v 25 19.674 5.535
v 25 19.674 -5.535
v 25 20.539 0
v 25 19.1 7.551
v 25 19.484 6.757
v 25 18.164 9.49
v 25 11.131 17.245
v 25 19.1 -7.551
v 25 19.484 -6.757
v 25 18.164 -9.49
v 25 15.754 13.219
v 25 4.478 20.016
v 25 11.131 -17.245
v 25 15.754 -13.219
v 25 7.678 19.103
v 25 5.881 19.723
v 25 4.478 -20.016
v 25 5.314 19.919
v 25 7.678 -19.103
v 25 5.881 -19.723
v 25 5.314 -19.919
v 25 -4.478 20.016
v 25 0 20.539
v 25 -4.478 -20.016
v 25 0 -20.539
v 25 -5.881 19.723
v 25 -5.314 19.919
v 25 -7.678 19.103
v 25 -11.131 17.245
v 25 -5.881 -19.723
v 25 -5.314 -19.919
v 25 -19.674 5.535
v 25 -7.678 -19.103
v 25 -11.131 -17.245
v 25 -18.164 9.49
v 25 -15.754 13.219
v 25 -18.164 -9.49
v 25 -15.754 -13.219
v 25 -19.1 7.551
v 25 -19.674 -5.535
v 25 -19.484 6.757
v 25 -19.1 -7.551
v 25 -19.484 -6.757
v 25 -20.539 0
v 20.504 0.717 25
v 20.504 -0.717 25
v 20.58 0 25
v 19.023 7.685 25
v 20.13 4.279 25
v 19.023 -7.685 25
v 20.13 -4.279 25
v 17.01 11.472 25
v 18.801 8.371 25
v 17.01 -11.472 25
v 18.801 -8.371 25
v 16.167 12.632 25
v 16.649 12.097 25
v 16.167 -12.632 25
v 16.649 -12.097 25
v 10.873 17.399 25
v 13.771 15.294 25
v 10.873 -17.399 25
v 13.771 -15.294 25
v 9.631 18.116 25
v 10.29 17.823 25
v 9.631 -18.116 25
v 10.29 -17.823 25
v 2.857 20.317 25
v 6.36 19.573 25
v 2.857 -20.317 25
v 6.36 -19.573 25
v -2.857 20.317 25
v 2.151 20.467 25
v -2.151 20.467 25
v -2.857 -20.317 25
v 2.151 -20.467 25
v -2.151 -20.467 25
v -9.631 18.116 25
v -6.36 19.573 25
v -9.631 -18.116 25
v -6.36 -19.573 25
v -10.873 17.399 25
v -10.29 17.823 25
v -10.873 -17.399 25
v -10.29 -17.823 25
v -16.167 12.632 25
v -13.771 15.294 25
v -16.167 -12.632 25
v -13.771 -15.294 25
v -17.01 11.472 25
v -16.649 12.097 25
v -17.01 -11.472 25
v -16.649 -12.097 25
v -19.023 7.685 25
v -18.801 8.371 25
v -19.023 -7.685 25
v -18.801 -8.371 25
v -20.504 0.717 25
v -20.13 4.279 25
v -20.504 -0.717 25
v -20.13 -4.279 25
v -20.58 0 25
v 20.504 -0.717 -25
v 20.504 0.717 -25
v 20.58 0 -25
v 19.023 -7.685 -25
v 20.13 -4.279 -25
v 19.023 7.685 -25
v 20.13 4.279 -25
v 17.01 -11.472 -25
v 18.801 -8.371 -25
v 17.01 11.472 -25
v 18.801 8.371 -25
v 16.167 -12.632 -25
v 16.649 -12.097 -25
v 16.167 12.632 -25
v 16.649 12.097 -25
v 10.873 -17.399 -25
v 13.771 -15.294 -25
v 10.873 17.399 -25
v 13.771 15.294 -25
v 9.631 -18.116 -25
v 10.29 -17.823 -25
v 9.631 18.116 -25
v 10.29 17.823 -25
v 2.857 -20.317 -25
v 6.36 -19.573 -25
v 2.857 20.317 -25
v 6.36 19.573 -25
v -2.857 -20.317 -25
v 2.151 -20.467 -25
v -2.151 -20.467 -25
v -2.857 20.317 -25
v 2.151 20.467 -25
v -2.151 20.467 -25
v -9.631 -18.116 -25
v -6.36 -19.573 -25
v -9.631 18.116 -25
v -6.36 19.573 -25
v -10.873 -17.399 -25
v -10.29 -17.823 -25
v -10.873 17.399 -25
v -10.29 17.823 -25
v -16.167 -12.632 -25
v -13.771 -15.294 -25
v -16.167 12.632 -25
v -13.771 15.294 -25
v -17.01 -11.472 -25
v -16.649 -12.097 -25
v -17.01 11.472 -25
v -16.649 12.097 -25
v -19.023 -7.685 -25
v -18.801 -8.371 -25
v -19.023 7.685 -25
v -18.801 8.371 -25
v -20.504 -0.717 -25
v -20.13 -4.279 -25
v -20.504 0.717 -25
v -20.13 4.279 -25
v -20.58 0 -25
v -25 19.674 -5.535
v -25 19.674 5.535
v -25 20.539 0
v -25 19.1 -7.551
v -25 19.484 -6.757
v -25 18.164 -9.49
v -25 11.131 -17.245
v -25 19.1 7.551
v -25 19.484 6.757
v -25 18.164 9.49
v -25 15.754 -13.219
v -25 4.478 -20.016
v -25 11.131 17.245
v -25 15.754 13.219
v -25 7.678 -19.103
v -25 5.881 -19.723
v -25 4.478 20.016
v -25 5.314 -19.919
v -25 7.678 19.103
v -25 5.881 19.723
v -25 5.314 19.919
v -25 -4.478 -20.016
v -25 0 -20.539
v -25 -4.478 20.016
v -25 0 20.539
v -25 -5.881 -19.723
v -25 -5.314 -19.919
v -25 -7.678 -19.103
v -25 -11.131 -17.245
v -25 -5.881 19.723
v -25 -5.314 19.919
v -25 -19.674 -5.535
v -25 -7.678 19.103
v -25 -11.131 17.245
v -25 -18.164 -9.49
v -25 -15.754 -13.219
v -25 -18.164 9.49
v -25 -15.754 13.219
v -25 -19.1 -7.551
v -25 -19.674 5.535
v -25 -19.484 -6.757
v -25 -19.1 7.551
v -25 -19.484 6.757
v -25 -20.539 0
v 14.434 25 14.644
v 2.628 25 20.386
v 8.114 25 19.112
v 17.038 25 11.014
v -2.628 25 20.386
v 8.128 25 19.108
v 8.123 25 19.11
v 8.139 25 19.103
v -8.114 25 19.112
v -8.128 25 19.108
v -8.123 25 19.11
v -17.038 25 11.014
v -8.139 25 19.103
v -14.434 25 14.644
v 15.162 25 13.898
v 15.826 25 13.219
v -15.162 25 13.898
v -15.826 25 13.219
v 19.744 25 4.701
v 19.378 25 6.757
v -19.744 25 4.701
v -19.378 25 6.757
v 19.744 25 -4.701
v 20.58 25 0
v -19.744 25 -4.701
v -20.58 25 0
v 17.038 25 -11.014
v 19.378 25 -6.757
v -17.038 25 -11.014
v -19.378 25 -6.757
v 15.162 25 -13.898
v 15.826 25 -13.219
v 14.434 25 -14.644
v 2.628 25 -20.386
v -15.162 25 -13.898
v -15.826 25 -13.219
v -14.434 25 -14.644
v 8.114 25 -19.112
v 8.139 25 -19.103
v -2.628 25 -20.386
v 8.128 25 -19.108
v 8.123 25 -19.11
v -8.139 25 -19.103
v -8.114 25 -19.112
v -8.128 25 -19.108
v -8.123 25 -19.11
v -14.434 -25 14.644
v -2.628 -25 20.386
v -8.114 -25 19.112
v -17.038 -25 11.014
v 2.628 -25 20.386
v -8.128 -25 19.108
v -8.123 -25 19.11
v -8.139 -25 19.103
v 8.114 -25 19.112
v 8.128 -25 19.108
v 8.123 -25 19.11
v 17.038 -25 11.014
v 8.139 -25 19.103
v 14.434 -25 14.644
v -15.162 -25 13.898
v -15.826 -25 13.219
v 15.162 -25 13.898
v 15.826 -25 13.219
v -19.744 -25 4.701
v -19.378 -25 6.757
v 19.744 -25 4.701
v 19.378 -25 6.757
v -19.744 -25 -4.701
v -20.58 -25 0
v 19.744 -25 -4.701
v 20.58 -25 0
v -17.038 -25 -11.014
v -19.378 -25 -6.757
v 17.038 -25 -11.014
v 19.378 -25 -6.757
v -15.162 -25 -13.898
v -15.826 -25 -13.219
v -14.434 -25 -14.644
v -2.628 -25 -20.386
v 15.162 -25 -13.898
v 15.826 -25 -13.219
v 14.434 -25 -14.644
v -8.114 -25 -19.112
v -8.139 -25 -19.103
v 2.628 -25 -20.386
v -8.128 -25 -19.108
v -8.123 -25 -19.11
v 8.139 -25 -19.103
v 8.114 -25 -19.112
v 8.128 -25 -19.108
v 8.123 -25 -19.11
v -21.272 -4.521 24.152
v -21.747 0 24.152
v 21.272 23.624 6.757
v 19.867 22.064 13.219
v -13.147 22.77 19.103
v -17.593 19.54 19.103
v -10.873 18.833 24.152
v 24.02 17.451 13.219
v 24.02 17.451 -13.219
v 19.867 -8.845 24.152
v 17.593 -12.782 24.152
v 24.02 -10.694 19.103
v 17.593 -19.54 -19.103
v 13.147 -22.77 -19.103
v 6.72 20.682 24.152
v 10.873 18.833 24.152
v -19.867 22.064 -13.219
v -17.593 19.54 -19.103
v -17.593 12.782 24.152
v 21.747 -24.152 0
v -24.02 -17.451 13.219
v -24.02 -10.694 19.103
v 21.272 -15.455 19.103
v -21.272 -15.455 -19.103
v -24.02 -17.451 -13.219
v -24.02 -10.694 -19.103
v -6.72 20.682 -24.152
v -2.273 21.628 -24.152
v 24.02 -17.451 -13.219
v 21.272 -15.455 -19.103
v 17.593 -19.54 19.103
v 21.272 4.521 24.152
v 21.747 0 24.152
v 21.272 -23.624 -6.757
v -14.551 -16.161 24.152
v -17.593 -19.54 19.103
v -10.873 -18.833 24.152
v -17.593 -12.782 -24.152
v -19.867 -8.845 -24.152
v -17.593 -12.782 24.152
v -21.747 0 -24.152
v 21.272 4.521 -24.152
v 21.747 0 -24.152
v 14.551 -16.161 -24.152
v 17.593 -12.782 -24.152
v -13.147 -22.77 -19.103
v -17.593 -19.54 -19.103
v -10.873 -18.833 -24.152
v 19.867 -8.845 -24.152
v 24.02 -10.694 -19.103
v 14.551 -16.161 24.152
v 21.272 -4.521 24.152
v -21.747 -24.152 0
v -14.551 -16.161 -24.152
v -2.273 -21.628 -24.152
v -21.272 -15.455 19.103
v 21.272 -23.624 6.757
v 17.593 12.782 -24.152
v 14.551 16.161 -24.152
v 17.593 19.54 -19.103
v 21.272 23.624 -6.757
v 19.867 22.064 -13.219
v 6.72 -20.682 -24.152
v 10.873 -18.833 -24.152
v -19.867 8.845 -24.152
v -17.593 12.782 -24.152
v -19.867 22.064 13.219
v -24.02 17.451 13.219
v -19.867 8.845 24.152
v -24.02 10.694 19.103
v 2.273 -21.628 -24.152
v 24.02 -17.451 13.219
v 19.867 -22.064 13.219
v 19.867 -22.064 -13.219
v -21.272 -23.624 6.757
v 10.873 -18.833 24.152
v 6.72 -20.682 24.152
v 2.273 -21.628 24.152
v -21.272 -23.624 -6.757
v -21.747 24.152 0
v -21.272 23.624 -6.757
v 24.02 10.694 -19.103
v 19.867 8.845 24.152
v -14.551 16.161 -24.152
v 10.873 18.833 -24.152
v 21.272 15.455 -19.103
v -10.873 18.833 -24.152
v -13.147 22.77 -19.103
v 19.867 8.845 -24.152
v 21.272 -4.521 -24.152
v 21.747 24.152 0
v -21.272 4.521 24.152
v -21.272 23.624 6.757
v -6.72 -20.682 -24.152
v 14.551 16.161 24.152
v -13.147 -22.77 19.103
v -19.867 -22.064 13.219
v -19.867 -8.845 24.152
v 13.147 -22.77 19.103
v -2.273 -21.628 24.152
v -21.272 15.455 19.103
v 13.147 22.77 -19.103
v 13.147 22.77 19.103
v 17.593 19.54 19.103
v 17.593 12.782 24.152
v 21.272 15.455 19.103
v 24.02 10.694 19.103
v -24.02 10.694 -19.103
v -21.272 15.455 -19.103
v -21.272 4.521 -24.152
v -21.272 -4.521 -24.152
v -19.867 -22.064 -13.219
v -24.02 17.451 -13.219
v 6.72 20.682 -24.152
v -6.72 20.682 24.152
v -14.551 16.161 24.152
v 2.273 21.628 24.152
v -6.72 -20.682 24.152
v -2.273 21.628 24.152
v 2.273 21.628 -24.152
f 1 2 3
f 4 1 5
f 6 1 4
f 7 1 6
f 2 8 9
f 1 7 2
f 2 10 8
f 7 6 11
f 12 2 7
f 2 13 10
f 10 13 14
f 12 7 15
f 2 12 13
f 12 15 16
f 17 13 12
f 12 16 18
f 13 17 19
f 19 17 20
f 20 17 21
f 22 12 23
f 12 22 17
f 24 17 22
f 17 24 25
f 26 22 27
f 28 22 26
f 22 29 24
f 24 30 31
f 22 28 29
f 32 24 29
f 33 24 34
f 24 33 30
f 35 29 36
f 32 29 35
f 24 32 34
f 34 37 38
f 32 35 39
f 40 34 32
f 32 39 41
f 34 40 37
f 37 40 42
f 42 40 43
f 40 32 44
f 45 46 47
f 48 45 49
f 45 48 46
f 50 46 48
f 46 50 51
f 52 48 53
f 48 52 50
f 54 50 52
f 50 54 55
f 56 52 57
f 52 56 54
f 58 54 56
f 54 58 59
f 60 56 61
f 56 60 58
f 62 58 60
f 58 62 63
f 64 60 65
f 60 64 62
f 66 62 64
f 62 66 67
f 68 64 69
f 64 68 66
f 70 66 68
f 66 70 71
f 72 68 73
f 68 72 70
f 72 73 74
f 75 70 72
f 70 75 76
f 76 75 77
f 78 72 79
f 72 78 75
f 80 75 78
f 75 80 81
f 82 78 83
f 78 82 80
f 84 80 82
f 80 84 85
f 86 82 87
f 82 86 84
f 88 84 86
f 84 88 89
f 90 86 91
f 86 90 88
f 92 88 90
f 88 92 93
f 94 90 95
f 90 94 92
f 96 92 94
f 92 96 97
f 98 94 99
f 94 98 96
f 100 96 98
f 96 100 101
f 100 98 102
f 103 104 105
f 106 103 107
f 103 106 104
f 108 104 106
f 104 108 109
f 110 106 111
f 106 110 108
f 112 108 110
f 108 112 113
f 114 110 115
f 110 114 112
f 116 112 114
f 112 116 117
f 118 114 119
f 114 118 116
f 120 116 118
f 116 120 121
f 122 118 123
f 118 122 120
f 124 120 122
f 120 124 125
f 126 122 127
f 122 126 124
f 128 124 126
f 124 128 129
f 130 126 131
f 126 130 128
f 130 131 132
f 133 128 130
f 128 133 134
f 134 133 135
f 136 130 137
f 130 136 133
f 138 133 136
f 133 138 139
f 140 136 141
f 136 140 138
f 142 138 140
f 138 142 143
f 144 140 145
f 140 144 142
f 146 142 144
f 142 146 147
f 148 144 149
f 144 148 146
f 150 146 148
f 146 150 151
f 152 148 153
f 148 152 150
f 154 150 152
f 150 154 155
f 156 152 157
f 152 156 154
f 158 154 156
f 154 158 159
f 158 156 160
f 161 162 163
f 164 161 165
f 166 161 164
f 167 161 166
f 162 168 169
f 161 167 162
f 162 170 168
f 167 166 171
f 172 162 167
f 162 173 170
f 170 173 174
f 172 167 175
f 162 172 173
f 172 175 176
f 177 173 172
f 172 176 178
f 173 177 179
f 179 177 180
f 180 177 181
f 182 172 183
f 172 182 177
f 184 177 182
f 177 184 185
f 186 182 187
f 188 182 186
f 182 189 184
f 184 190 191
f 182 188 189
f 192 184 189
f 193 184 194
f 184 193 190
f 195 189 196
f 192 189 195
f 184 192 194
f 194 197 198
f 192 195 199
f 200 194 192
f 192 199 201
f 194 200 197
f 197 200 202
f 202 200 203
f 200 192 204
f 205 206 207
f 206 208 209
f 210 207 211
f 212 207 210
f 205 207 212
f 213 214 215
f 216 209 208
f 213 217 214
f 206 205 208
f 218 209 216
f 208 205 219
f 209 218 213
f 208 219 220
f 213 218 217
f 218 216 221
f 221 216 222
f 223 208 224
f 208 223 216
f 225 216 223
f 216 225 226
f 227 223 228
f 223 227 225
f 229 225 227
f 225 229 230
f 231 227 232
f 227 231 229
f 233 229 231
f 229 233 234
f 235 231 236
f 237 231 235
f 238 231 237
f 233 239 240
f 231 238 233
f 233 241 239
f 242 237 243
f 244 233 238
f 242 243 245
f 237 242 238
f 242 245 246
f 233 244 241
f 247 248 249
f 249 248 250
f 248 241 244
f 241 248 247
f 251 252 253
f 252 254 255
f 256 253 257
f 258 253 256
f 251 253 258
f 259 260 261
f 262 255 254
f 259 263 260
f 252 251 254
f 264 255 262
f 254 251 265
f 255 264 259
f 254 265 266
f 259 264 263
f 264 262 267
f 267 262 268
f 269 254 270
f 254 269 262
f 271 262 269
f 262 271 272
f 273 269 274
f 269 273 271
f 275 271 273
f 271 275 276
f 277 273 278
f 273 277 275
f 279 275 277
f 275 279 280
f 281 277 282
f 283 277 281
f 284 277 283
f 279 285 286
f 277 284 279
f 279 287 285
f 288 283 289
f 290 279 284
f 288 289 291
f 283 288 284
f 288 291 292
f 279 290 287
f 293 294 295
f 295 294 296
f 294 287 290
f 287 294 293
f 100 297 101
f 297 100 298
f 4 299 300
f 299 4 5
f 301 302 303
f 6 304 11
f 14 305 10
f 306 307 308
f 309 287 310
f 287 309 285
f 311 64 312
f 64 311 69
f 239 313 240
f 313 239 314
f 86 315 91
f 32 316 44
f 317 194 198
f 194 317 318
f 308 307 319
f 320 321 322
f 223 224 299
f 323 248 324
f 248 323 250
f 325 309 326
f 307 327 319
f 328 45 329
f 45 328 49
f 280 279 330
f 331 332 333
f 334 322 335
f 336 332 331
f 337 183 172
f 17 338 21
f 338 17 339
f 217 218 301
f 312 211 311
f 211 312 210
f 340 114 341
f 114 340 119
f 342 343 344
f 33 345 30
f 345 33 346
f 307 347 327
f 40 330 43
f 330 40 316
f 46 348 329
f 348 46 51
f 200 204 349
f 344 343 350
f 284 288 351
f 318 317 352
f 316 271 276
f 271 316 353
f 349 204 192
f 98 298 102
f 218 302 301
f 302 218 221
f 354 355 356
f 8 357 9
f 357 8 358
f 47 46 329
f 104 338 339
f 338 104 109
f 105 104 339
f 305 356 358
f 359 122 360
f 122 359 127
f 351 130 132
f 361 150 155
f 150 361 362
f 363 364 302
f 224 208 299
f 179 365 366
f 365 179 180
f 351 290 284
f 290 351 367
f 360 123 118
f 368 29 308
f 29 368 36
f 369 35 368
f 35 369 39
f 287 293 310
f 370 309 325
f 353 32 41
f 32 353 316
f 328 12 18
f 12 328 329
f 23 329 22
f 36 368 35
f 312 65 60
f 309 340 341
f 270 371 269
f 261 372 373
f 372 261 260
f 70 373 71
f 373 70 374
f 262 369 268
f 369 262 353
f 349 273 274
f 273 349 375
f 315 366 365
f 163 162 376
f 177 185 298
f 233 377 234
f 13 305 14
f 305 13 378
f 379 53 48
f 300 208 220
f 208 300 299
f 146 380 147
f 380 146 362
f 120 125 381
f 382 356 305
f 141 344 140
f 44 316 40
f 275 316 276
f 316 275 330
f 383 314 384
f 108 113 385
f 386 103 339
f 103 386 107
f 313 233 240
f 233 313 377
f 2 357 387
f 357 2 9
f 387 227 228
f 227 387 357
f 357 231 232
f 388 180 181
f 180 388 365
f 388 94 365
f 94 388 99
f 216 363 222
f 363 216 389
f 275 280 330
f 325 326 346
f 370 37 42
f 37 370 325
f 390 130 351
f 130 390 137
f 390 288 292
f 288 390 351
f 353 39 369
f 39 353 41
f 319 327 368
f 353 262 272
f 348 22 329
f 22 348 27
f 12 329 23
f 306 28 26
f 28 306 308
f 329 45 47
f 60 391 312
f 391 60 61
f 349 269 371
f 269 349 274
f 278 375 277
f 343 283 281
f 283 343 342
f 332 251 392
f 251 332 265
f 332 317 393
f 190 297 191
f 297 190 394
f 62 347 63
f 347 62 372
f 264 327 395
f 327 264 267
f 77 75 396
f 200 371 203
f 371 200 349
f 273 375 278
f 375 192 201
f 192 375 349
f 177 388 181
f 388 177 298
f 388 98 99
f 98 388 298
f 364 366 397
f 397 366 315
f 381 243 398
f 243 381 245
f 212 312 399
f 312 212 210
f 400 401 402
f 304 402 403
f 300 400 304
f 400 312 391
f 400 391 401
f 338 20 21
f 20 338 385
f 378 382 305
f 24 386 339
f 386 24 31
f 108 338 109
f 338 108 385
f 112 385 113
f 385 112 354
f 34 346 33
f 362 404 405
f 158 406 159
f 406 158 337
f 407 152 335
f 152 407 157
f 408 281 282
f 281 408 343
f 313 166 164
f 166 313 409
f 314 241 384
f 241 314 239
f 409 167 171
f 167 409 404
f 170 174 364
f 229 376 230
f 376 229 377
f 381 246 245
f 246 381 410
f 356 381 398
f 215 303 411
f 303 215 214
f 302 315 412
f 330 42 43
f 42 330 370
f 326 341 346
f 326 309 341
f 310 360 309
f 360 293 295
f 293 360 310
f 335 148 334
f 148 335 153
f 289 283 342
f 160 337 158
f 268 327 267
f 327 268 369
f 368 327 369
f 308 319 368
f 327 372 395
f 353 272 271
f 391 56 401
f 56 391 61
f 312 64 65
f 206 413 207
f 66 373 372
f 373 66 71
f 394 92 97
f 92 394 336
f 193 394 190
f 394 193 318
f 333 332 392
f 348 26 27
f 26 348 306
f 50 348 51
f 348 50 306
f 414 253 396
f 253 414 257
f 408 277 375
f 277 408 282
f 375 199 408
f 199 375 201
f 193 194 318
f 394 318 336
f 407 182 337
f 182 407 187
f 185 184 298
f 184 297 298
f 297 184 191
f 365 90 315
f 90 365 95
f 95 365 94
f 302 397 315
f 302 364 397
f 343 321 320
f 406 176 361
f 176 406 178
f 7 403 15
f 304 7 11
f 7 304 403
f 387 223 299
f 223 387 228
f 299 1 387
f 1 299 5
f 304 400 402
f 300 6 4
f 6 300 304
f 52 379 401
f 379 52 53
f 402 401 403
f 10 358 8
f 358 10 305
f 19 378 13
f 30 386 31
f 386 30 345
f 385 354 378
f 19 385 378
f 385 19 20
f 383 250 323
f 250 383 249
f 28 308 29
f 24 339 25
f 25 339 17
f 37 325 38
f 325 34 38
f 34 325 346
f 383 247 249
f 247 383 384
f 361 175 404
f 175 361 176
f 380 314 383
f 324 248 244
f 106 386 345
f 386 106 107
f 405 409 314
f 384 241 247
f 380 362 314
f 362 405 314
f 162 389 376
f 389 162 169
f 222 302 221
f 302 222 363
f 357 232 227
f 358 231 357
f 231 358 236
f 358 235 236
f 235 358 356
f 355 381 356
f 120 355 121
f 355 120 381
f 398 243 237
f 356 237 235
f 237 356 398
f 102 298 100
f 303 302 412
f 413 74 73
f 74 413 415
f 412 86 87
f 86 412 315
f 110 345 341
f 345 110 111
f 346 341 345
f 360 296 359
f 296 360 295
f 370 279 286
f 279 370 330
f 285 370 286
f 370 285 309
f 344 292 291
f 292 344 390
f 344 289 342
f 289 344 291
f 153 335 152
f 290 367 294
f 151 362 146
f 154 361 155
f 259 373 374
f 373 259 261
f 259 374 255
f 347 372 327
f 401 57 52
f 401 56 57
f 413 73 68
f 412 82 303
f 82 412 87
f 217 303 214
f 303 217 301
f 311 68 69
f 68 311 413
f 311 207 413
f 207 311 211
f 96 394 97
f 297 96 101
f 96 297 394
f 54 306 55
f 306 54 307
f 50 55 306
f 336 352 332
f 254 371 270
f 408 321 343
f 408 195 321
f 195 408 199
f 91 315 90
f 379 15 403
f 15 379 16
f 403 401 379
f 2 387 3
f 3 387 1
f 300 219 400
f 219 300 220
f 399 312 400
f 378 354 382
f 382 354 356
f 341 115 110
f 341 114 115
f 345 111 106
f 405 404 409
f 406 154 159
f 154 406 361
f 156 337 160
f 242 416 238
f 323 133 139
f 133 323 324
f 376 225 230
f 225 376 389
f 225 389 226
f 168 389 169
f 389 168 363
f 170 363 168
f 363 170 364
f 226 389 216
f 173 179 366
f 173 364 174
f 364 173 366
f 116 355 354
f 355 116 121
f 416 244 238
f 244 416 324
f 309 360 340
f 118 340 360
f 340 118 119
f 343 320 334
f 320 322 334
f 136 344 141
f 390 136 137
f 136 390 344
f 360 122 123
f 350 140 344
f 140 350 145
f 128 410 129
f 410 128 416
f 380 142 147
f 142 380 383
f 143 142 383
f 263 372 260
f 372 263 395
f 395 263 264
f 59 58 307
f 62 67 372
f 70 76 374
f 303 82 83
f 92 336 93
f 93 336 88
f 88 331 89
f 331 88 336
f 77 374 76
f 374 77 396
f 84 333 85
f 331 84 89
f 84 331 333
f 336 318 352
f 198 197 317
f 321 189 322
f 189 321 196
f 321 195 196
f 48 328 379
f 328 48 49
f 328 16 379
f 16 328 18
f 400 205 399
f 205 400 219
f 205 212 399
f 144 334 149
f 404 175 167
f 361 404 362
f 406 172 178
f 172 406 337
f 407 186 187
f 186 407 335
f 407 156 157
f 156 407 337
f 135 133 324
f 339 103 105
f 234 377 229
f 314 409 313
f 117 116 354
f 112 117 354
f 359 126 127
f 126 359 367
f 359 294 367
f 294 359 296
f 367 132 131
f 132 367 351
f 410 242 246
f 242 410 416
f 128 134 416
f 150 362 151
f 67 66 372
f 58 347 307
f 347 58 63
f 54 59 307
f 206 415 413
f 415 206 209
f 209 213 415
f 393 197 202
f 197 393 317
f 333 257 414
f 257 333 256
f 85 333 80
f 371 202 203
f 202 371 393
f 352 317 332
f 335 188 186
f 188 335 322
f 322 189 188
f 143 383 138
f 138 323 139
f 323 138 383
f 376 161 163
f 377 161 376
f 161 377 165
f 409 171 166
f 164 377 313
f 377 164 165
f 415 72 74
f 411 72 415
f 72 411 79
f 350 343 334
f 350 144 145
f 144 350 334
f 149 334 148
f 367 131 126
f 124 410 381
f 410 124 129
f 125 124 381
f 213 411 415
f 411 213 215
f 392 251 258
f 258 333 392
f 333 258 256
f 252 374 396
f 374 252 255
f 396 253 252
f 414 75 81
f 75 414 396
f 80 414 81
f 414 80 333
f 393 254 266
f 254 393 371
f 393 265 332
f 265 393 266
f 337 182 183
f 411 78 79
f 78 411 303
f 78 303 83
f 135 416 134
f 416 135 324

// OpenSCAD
intersection() {
    color("lightblue") cube(50, center = true);
    color("red") sphere(d = 65);
}
